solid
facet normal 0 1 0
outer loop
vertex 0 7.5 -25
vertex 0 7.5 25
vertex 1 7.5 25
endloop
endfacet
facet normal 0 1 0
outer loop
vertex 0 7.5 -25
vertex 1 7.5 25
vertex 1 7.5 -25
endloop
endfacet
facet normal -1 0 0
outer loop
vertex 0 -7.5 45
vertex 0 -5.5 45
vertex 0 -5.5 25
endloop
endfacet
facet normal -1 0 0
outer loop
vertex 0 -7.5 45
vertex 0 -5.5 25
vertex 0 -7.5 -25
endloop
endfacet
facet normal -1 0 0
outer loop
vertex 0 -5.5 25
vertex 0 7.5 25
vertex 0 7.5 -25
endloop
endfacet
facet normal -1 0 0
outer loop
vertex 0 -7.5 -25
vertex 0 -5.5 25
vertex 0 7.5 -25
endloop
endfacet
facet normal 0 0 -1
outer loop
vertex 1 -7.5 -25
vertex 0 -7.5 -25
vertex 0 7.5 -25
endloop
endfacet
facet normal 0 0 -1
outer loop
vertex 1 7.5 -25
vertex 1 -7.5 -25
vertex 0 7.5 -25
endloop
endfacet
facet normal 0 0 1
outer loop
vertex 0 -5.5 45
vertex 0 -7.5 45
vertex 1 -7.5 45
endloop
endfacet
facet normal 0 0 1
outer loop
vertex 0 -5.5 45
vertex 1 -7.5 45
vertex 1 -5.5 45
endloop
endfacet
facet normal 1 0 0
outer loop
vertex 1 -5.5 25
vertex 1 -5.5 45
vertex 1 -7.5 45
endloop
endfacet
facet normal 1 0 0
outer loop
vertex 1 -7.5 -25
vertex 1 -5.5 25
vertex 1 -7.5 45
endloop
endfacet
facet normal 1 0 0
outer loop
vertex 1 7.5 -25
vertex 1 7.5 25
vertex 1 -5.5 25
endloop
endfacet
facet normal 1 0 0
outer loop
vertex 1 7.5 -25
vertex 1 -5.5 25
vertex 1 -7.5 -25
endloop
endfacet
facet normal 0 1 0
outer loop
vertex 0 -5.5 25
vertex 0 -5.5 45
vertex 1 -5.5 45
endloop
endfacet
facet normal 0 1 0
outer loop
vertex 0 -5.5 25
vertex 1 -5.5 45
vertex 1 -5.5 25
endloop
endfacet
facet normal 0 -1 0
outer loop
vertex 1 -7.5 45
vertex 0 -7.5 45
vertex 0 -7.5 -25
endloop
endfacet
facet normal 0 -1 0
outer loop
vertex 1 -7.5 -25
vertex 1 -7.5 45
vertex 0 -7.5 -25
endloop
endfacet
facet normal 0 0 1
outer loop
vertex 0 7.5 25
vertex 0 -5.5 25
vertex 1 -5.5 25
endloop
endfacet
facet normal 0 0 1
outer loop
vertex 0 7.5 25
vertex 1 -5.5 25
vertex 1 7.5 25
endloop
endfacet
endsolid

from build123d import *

# Parameters (mm, degrees)
CROQUIS1_W              = 20
CROQUIS1_H              = 2
CROQUIS1_W_2            = 50
CROQUIS1_H_2            = 15
SALIENTE_EXTRUIR1_DEPTH = 1


with BuildPart() as part:
    # Croquis1 → Saliente-Extruir1 (new body)
    with BuildSketch(Plane(origin=(0, 0, 0), x_dir=(0, 0, -1), z_dir=(1, 0, 0))):
        with Locations((-35, -6.5)):
            Rectangle(CROQUIS1_W, CROQUIS1_H)
        Rectangle(CROQUIS1_W_2, CROQUIS1_H_2)
    extrude(amount=SALIENTE_EXTRUIR1_DEPTH)


solid = part.part
